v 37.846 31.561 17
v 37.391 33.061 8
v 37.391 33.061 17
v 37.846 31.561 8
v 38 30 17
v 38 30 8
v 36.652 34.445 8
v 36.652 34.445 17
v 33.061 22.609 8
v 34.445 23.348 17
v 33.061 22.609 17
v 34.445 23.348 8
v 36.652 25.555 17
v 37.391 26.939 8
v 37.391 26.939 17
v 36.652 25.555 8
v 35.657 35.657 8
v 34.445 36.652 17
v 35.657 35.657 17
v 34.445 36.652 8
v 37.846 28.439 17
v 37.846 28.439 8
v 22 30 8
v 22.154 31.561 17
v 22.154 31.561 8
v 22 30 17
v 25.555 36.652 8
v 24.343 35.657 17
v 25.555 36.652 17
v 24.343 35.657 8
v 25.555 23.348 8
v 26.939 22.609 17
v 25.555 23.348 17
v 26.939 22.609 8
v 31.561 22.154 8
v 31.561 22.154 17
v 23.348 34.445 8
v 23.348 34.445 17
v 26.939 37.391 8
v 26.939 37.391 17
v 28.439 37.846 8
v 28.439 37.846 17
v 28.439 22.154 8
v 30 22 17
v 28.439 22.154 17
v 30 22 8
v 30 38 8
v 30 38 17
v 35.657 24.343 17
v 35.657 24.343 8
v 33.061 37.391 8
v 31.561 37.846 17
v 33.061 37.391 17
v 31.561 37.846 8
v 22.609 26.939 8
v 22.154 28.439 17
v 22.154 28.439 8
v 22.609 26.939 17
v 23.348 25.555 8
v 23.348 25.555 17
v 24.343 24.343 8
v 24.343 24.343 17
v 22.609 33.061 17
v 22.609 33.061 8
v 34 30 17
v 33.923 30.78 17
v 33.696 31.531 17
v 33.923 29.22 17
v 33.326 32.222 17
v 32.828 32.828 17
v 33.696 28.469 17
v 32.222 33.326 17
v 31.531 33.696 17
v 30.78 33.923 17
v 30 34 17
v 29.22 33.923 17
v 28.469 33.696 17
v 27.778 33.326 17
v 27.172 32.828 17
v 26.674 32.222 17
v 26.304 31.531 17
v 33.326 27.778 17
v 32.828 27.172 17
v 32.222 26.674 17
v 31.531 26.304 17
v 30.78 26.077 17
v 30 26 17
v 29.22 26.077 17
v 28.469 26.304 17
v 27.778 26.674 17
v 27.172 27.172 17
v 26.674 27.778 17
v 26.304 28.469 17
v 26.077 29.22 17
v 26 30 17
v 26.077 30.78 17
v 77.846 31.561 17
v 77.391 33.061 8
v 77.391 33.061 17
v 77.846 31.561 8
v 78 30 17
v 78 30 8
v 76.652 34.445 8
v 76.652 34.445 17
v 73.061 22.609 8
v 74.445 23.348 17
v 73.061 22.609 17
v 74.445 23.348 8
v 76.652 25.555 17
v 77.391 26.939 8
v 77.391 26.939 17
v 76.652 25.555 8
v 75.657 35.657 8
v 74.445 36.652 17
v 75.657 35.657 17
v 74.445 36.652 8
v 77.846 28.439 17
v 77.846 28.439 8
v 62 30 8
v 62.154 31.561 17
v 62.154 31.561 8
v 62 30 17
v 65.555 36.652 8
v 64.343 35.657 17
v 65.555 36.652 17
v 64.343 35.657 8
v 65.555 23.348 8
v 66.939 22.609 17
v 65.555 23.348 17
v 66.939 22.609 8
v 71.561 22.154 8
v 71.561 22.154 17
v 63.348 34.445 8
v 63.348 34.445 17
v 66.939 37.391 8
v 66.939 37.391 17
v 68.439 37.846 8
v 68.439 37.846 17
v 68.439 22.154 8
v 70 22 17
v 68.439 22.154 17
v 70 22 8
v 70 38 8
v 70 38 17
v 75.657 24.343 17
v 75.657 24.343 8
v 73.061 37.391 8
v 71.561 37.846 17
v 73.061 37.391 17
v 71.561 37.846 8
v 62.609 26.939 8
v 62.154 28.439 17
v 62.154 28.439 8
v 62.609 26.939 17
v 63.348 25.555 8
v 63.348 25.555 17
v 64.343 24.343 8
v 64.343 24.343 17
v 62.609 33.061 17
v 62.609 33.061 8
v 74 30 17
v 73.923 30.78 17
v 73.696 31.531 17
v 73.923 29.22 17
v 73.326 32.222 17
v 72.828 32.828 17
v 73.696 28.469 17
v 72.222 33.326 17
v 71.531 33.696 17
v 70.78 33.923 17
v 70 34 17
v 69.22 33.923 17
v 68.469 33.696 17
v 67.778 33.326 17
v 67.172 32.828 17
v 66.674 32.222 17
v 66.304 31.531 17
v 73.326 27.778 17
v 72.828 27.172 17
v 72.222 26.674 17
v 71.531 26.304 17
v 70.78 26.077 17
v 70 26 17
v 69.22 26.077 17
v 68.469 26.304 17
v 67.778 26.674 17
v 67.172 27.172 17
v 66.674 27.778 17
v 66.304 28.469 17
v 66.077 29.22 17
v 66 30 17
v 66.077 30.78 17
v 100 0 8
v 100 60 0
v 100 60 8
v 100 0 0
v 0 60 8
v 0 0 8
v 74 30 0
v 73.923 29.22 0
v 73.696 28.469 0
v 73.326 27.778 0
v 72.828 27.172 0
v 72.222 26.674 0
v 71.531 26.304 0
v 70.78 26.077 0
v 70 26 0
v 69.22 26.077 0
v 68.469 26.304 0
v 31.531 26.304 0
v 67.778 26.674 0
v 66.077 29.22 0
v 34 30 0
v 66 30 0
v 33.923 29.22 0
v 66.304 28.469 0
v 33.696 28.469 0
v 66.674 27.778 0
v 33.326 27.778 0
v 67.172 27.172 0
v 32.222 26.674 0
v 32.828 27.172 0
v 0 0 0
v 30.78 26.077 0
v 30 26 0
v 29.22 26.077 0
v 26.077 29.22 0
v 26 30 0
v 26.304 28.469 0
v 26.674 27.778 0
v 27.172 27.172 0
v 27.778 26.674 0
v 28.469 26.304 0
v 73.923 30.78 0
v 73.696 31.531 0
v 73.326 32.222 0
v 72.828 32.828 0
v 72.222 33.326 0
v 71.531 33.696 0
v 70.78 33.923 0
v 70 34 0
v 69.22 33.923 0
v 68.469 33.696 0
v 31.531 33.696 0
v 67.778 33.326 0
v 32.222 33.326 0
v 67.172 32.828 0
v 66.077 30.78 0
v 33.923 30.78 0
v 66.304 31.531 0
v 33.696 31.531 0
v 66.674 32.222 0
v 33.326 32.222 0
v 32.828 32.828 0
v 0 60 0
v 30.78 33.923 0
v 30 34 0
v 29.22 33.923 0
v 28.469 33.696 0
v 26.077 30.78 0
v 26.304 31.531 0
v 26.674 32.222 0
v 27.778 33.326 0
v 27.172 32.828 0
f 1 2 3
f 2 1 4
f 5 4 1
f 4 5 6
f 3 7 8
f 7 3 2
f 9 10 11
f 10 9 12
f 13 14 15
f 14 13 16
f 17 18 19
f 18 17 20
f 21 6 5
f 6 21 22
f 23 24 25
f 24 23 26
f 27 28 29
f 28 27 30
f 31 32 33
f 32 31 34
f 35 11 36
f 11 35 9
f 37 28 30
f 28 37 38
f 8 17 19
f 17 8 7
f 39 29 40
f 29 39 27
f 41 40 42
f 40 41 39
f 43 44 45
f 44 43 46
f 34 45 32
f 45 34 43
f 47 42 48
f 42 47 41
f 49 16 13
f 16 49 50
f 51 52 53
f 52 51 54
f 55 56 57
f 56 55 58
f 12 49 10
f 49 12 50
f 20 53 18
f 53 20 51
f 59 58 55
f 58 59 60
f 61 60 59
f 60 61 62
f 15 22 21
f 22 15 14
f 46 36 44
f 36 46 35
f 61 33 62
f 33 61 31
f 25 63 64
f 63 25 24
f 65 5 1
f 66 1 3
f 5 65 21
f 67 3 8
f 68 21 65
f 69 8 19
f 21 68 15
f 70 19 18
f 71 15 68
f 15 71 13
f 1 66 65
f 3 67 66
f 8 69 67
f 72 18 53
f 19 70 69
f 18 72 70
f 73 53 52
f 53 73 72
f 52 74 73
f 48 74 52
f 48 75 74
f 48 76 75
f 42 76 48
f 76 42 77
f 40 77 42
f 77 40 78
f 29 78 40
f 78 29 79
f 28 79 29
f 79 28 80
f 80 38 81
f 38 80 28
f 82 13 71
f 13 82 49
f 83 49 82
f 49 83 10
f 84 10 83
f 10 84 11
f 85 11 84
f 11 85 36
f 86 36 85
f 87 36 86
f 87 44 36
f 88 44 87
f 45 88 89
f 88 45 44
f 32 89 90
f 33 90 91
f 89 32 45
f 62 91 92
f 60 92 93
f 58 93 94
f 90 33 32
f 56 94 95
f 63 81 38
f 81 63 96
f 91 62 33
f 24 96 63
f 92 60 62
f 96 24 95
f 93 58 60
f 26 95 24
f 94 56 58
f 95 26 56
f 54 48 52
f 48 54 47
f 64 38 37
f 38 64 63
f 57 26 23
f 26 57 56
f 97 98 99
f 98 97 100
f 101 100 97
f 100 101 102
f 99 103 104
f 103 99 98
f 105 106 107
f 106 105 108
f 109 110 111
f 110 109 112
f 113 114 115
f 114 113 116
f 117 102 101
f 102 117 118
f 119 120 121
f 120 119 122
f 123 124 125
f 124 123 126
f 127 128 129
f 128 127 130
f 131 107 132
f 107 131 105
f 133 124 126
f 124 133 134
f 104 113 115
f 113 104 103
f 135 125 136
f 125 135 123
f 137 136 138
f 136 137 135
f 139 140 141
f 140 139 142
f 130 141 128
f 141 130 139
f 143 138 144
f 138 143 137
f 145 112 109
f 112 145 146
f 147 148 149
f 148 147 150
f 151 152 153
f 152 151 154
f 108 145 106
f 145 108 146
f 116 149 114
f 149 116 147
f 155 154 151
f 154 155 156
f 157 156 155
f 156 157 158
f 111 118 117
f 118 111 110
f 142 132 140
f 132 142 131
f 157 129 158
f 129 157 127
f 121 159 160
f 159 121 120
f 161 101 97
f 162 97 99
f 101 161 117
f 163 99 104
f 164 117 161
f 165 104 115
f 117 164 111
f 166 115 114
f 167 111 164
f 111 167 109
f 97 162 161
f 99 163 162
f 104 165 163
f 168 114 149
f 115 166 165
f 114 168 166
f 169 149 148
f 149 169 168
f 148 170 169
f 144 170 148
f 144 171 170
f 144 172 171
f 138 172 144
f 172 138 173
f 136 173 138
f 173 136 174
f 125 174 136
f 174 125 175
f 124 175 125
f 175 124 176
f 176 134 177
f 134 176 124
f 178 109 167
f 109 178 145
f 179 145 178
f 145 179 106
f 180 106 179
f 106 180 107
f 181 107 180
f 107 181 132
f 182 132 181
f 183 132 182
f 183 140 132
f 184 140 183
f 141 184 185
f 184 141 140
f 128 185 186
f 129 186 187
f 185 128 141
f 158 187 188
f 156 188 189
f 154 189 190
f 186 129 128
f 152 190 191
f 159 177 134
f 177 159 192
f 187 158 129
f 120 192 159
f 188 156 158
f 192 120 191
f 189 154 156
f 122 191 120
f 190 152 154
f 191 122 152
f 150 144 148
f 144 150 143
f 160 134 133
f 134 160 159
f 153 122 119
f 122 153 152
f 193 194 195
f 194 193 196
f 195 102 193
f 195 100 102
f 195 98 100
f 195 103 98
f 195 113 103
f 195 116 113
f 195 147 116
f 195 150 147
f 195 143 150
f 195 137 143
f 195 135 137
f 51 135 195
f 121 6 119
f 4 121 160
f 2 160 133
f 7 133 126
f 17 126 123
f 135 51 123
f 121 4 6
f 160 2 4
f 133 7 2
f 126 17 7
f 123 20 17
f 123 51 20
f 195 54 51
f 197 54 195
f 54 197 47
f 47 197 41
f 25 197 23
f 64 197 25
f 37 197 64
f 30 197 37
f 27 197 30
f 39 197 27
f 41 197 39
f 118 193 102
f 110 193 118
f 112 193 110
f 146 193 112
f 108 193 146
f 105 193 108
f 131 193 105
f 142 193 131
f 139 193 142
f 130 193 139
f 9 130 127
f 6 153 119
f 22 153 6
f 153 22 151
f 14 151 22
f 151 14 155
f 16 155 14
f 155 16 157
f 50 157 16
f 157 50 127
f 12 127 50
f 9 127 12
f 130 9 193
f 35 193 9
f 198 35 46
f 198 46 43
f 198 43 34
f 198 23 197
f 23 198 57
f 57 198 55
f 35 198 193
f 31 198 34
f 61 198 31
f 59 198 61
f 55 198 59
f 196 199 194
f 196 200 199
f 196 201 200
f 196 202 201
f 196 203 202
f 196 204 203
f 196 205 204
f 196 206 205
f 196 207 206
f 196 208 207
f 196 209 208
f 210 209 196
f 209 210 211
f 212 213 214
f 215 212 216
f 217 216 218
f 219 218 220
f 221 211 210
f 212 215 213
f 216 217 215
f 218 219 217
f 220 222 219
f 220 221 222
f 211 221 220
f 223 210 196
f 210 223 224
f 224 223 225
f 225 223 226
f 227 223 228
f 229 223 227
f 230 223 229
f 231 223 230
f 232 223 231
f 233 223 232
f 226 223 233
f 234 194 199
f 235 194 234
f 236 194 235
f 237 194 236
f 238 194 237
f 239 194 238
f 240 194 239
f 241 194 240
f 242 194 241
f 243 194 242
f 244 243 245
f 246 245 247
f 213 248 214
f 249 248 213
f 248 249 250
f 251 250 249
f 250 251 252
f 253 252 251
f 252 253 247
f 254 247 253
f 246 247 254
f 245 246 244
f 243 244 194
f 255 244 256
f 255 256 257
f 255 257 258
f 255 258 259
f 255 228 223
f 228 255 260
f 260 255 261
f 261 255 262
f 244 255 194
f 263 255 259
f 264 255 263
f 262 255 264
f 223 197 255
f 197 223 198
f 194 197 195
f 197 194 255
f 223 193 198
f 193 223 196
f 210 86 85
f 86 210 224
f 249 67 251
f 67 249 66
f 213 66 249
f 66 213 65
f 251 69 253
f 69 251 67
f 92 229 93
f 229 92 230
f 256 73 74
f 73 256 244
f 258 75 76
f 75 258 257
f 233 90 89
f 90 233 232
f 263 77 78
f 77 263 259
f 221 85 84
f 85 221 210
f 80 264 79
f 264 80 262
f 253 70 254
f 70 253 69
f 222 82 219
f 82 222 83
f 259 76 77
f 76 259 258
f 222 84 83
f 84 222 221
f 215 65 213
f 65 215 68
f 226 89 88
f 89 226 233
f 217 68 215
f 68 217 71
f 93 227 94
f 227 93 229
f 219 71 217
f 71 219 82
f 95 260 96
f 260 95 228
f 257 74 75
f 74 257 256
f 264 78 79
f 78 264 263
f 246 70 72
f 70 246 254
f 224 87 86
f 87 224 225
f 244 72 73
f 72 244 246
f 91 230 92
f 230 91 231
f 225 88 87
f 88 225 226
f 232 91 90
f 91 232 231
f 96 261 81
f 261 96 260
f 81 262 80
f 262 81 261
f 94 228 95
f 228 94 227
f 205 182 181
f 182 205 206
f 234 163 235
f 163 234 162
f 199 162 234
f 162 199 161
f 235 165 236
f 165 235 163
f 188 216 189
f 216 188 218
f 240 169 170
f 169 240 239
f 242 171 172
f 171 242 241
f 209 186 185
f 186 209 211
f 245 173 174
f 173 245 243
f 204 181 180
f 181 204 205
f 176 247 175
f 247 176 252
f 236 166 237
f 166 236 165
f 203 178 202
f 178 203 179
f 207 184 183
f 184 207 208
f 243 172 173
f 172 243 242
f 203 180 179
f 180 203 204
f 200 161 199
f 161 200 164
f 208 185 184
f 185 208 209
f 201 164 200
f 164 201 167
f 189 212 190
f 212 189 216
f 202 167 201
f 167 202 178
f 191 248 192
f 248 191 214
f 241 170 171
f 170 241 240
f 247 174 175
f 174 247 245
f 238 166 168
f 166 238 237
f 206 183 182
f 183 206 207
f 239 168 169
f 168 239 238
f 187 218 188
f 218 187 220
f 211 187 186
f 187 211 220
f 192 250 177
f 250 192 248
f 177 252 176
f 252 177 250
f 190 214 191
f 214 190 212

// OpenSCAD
$fn = 32;

// ----------------------------------------------------------------------
// Drill jig: two_boss jig
// ----------------------------------------------------------------------

// --- parameters (mm) ---
plate_l = 100;            // plate length, X
plate_w = 60;             // plate width, Y
plate_t = 8;              // plate thickness
boss_d = 16;              // guide boss diameter
boss_h = 10;              // boss height above the plate
guide_d = 8;              // guide hole diameter
boss_pitch = 40;          // boss pitch

n_boss = 2;  // guide bosses
boss_x0 = (plate_l - (n_boss - 1) * boss_pitch) / 2;  // first boss X
boss_top = plate_t - 1 + boss_h;  // boss crown height
total_h = boss_top;  // overall height

difference() {
  union() {
  cube([plate_l, plate_w, plate_t]);
  for (i = [0 : n_boss - 1])
    translate([boss_x0 + i * boss_pitch, plate_w / 2, plate_t - 1])
      cylinder(h = boss_h, d = boss_d);
  }
  for (i = [0 : n_boss - 1])
    translate([boss_x0 + i * boss_pitch, plate_w / 2, -1])
      cylinder(h = plate_t + boss_h, d = guide_d);
}
